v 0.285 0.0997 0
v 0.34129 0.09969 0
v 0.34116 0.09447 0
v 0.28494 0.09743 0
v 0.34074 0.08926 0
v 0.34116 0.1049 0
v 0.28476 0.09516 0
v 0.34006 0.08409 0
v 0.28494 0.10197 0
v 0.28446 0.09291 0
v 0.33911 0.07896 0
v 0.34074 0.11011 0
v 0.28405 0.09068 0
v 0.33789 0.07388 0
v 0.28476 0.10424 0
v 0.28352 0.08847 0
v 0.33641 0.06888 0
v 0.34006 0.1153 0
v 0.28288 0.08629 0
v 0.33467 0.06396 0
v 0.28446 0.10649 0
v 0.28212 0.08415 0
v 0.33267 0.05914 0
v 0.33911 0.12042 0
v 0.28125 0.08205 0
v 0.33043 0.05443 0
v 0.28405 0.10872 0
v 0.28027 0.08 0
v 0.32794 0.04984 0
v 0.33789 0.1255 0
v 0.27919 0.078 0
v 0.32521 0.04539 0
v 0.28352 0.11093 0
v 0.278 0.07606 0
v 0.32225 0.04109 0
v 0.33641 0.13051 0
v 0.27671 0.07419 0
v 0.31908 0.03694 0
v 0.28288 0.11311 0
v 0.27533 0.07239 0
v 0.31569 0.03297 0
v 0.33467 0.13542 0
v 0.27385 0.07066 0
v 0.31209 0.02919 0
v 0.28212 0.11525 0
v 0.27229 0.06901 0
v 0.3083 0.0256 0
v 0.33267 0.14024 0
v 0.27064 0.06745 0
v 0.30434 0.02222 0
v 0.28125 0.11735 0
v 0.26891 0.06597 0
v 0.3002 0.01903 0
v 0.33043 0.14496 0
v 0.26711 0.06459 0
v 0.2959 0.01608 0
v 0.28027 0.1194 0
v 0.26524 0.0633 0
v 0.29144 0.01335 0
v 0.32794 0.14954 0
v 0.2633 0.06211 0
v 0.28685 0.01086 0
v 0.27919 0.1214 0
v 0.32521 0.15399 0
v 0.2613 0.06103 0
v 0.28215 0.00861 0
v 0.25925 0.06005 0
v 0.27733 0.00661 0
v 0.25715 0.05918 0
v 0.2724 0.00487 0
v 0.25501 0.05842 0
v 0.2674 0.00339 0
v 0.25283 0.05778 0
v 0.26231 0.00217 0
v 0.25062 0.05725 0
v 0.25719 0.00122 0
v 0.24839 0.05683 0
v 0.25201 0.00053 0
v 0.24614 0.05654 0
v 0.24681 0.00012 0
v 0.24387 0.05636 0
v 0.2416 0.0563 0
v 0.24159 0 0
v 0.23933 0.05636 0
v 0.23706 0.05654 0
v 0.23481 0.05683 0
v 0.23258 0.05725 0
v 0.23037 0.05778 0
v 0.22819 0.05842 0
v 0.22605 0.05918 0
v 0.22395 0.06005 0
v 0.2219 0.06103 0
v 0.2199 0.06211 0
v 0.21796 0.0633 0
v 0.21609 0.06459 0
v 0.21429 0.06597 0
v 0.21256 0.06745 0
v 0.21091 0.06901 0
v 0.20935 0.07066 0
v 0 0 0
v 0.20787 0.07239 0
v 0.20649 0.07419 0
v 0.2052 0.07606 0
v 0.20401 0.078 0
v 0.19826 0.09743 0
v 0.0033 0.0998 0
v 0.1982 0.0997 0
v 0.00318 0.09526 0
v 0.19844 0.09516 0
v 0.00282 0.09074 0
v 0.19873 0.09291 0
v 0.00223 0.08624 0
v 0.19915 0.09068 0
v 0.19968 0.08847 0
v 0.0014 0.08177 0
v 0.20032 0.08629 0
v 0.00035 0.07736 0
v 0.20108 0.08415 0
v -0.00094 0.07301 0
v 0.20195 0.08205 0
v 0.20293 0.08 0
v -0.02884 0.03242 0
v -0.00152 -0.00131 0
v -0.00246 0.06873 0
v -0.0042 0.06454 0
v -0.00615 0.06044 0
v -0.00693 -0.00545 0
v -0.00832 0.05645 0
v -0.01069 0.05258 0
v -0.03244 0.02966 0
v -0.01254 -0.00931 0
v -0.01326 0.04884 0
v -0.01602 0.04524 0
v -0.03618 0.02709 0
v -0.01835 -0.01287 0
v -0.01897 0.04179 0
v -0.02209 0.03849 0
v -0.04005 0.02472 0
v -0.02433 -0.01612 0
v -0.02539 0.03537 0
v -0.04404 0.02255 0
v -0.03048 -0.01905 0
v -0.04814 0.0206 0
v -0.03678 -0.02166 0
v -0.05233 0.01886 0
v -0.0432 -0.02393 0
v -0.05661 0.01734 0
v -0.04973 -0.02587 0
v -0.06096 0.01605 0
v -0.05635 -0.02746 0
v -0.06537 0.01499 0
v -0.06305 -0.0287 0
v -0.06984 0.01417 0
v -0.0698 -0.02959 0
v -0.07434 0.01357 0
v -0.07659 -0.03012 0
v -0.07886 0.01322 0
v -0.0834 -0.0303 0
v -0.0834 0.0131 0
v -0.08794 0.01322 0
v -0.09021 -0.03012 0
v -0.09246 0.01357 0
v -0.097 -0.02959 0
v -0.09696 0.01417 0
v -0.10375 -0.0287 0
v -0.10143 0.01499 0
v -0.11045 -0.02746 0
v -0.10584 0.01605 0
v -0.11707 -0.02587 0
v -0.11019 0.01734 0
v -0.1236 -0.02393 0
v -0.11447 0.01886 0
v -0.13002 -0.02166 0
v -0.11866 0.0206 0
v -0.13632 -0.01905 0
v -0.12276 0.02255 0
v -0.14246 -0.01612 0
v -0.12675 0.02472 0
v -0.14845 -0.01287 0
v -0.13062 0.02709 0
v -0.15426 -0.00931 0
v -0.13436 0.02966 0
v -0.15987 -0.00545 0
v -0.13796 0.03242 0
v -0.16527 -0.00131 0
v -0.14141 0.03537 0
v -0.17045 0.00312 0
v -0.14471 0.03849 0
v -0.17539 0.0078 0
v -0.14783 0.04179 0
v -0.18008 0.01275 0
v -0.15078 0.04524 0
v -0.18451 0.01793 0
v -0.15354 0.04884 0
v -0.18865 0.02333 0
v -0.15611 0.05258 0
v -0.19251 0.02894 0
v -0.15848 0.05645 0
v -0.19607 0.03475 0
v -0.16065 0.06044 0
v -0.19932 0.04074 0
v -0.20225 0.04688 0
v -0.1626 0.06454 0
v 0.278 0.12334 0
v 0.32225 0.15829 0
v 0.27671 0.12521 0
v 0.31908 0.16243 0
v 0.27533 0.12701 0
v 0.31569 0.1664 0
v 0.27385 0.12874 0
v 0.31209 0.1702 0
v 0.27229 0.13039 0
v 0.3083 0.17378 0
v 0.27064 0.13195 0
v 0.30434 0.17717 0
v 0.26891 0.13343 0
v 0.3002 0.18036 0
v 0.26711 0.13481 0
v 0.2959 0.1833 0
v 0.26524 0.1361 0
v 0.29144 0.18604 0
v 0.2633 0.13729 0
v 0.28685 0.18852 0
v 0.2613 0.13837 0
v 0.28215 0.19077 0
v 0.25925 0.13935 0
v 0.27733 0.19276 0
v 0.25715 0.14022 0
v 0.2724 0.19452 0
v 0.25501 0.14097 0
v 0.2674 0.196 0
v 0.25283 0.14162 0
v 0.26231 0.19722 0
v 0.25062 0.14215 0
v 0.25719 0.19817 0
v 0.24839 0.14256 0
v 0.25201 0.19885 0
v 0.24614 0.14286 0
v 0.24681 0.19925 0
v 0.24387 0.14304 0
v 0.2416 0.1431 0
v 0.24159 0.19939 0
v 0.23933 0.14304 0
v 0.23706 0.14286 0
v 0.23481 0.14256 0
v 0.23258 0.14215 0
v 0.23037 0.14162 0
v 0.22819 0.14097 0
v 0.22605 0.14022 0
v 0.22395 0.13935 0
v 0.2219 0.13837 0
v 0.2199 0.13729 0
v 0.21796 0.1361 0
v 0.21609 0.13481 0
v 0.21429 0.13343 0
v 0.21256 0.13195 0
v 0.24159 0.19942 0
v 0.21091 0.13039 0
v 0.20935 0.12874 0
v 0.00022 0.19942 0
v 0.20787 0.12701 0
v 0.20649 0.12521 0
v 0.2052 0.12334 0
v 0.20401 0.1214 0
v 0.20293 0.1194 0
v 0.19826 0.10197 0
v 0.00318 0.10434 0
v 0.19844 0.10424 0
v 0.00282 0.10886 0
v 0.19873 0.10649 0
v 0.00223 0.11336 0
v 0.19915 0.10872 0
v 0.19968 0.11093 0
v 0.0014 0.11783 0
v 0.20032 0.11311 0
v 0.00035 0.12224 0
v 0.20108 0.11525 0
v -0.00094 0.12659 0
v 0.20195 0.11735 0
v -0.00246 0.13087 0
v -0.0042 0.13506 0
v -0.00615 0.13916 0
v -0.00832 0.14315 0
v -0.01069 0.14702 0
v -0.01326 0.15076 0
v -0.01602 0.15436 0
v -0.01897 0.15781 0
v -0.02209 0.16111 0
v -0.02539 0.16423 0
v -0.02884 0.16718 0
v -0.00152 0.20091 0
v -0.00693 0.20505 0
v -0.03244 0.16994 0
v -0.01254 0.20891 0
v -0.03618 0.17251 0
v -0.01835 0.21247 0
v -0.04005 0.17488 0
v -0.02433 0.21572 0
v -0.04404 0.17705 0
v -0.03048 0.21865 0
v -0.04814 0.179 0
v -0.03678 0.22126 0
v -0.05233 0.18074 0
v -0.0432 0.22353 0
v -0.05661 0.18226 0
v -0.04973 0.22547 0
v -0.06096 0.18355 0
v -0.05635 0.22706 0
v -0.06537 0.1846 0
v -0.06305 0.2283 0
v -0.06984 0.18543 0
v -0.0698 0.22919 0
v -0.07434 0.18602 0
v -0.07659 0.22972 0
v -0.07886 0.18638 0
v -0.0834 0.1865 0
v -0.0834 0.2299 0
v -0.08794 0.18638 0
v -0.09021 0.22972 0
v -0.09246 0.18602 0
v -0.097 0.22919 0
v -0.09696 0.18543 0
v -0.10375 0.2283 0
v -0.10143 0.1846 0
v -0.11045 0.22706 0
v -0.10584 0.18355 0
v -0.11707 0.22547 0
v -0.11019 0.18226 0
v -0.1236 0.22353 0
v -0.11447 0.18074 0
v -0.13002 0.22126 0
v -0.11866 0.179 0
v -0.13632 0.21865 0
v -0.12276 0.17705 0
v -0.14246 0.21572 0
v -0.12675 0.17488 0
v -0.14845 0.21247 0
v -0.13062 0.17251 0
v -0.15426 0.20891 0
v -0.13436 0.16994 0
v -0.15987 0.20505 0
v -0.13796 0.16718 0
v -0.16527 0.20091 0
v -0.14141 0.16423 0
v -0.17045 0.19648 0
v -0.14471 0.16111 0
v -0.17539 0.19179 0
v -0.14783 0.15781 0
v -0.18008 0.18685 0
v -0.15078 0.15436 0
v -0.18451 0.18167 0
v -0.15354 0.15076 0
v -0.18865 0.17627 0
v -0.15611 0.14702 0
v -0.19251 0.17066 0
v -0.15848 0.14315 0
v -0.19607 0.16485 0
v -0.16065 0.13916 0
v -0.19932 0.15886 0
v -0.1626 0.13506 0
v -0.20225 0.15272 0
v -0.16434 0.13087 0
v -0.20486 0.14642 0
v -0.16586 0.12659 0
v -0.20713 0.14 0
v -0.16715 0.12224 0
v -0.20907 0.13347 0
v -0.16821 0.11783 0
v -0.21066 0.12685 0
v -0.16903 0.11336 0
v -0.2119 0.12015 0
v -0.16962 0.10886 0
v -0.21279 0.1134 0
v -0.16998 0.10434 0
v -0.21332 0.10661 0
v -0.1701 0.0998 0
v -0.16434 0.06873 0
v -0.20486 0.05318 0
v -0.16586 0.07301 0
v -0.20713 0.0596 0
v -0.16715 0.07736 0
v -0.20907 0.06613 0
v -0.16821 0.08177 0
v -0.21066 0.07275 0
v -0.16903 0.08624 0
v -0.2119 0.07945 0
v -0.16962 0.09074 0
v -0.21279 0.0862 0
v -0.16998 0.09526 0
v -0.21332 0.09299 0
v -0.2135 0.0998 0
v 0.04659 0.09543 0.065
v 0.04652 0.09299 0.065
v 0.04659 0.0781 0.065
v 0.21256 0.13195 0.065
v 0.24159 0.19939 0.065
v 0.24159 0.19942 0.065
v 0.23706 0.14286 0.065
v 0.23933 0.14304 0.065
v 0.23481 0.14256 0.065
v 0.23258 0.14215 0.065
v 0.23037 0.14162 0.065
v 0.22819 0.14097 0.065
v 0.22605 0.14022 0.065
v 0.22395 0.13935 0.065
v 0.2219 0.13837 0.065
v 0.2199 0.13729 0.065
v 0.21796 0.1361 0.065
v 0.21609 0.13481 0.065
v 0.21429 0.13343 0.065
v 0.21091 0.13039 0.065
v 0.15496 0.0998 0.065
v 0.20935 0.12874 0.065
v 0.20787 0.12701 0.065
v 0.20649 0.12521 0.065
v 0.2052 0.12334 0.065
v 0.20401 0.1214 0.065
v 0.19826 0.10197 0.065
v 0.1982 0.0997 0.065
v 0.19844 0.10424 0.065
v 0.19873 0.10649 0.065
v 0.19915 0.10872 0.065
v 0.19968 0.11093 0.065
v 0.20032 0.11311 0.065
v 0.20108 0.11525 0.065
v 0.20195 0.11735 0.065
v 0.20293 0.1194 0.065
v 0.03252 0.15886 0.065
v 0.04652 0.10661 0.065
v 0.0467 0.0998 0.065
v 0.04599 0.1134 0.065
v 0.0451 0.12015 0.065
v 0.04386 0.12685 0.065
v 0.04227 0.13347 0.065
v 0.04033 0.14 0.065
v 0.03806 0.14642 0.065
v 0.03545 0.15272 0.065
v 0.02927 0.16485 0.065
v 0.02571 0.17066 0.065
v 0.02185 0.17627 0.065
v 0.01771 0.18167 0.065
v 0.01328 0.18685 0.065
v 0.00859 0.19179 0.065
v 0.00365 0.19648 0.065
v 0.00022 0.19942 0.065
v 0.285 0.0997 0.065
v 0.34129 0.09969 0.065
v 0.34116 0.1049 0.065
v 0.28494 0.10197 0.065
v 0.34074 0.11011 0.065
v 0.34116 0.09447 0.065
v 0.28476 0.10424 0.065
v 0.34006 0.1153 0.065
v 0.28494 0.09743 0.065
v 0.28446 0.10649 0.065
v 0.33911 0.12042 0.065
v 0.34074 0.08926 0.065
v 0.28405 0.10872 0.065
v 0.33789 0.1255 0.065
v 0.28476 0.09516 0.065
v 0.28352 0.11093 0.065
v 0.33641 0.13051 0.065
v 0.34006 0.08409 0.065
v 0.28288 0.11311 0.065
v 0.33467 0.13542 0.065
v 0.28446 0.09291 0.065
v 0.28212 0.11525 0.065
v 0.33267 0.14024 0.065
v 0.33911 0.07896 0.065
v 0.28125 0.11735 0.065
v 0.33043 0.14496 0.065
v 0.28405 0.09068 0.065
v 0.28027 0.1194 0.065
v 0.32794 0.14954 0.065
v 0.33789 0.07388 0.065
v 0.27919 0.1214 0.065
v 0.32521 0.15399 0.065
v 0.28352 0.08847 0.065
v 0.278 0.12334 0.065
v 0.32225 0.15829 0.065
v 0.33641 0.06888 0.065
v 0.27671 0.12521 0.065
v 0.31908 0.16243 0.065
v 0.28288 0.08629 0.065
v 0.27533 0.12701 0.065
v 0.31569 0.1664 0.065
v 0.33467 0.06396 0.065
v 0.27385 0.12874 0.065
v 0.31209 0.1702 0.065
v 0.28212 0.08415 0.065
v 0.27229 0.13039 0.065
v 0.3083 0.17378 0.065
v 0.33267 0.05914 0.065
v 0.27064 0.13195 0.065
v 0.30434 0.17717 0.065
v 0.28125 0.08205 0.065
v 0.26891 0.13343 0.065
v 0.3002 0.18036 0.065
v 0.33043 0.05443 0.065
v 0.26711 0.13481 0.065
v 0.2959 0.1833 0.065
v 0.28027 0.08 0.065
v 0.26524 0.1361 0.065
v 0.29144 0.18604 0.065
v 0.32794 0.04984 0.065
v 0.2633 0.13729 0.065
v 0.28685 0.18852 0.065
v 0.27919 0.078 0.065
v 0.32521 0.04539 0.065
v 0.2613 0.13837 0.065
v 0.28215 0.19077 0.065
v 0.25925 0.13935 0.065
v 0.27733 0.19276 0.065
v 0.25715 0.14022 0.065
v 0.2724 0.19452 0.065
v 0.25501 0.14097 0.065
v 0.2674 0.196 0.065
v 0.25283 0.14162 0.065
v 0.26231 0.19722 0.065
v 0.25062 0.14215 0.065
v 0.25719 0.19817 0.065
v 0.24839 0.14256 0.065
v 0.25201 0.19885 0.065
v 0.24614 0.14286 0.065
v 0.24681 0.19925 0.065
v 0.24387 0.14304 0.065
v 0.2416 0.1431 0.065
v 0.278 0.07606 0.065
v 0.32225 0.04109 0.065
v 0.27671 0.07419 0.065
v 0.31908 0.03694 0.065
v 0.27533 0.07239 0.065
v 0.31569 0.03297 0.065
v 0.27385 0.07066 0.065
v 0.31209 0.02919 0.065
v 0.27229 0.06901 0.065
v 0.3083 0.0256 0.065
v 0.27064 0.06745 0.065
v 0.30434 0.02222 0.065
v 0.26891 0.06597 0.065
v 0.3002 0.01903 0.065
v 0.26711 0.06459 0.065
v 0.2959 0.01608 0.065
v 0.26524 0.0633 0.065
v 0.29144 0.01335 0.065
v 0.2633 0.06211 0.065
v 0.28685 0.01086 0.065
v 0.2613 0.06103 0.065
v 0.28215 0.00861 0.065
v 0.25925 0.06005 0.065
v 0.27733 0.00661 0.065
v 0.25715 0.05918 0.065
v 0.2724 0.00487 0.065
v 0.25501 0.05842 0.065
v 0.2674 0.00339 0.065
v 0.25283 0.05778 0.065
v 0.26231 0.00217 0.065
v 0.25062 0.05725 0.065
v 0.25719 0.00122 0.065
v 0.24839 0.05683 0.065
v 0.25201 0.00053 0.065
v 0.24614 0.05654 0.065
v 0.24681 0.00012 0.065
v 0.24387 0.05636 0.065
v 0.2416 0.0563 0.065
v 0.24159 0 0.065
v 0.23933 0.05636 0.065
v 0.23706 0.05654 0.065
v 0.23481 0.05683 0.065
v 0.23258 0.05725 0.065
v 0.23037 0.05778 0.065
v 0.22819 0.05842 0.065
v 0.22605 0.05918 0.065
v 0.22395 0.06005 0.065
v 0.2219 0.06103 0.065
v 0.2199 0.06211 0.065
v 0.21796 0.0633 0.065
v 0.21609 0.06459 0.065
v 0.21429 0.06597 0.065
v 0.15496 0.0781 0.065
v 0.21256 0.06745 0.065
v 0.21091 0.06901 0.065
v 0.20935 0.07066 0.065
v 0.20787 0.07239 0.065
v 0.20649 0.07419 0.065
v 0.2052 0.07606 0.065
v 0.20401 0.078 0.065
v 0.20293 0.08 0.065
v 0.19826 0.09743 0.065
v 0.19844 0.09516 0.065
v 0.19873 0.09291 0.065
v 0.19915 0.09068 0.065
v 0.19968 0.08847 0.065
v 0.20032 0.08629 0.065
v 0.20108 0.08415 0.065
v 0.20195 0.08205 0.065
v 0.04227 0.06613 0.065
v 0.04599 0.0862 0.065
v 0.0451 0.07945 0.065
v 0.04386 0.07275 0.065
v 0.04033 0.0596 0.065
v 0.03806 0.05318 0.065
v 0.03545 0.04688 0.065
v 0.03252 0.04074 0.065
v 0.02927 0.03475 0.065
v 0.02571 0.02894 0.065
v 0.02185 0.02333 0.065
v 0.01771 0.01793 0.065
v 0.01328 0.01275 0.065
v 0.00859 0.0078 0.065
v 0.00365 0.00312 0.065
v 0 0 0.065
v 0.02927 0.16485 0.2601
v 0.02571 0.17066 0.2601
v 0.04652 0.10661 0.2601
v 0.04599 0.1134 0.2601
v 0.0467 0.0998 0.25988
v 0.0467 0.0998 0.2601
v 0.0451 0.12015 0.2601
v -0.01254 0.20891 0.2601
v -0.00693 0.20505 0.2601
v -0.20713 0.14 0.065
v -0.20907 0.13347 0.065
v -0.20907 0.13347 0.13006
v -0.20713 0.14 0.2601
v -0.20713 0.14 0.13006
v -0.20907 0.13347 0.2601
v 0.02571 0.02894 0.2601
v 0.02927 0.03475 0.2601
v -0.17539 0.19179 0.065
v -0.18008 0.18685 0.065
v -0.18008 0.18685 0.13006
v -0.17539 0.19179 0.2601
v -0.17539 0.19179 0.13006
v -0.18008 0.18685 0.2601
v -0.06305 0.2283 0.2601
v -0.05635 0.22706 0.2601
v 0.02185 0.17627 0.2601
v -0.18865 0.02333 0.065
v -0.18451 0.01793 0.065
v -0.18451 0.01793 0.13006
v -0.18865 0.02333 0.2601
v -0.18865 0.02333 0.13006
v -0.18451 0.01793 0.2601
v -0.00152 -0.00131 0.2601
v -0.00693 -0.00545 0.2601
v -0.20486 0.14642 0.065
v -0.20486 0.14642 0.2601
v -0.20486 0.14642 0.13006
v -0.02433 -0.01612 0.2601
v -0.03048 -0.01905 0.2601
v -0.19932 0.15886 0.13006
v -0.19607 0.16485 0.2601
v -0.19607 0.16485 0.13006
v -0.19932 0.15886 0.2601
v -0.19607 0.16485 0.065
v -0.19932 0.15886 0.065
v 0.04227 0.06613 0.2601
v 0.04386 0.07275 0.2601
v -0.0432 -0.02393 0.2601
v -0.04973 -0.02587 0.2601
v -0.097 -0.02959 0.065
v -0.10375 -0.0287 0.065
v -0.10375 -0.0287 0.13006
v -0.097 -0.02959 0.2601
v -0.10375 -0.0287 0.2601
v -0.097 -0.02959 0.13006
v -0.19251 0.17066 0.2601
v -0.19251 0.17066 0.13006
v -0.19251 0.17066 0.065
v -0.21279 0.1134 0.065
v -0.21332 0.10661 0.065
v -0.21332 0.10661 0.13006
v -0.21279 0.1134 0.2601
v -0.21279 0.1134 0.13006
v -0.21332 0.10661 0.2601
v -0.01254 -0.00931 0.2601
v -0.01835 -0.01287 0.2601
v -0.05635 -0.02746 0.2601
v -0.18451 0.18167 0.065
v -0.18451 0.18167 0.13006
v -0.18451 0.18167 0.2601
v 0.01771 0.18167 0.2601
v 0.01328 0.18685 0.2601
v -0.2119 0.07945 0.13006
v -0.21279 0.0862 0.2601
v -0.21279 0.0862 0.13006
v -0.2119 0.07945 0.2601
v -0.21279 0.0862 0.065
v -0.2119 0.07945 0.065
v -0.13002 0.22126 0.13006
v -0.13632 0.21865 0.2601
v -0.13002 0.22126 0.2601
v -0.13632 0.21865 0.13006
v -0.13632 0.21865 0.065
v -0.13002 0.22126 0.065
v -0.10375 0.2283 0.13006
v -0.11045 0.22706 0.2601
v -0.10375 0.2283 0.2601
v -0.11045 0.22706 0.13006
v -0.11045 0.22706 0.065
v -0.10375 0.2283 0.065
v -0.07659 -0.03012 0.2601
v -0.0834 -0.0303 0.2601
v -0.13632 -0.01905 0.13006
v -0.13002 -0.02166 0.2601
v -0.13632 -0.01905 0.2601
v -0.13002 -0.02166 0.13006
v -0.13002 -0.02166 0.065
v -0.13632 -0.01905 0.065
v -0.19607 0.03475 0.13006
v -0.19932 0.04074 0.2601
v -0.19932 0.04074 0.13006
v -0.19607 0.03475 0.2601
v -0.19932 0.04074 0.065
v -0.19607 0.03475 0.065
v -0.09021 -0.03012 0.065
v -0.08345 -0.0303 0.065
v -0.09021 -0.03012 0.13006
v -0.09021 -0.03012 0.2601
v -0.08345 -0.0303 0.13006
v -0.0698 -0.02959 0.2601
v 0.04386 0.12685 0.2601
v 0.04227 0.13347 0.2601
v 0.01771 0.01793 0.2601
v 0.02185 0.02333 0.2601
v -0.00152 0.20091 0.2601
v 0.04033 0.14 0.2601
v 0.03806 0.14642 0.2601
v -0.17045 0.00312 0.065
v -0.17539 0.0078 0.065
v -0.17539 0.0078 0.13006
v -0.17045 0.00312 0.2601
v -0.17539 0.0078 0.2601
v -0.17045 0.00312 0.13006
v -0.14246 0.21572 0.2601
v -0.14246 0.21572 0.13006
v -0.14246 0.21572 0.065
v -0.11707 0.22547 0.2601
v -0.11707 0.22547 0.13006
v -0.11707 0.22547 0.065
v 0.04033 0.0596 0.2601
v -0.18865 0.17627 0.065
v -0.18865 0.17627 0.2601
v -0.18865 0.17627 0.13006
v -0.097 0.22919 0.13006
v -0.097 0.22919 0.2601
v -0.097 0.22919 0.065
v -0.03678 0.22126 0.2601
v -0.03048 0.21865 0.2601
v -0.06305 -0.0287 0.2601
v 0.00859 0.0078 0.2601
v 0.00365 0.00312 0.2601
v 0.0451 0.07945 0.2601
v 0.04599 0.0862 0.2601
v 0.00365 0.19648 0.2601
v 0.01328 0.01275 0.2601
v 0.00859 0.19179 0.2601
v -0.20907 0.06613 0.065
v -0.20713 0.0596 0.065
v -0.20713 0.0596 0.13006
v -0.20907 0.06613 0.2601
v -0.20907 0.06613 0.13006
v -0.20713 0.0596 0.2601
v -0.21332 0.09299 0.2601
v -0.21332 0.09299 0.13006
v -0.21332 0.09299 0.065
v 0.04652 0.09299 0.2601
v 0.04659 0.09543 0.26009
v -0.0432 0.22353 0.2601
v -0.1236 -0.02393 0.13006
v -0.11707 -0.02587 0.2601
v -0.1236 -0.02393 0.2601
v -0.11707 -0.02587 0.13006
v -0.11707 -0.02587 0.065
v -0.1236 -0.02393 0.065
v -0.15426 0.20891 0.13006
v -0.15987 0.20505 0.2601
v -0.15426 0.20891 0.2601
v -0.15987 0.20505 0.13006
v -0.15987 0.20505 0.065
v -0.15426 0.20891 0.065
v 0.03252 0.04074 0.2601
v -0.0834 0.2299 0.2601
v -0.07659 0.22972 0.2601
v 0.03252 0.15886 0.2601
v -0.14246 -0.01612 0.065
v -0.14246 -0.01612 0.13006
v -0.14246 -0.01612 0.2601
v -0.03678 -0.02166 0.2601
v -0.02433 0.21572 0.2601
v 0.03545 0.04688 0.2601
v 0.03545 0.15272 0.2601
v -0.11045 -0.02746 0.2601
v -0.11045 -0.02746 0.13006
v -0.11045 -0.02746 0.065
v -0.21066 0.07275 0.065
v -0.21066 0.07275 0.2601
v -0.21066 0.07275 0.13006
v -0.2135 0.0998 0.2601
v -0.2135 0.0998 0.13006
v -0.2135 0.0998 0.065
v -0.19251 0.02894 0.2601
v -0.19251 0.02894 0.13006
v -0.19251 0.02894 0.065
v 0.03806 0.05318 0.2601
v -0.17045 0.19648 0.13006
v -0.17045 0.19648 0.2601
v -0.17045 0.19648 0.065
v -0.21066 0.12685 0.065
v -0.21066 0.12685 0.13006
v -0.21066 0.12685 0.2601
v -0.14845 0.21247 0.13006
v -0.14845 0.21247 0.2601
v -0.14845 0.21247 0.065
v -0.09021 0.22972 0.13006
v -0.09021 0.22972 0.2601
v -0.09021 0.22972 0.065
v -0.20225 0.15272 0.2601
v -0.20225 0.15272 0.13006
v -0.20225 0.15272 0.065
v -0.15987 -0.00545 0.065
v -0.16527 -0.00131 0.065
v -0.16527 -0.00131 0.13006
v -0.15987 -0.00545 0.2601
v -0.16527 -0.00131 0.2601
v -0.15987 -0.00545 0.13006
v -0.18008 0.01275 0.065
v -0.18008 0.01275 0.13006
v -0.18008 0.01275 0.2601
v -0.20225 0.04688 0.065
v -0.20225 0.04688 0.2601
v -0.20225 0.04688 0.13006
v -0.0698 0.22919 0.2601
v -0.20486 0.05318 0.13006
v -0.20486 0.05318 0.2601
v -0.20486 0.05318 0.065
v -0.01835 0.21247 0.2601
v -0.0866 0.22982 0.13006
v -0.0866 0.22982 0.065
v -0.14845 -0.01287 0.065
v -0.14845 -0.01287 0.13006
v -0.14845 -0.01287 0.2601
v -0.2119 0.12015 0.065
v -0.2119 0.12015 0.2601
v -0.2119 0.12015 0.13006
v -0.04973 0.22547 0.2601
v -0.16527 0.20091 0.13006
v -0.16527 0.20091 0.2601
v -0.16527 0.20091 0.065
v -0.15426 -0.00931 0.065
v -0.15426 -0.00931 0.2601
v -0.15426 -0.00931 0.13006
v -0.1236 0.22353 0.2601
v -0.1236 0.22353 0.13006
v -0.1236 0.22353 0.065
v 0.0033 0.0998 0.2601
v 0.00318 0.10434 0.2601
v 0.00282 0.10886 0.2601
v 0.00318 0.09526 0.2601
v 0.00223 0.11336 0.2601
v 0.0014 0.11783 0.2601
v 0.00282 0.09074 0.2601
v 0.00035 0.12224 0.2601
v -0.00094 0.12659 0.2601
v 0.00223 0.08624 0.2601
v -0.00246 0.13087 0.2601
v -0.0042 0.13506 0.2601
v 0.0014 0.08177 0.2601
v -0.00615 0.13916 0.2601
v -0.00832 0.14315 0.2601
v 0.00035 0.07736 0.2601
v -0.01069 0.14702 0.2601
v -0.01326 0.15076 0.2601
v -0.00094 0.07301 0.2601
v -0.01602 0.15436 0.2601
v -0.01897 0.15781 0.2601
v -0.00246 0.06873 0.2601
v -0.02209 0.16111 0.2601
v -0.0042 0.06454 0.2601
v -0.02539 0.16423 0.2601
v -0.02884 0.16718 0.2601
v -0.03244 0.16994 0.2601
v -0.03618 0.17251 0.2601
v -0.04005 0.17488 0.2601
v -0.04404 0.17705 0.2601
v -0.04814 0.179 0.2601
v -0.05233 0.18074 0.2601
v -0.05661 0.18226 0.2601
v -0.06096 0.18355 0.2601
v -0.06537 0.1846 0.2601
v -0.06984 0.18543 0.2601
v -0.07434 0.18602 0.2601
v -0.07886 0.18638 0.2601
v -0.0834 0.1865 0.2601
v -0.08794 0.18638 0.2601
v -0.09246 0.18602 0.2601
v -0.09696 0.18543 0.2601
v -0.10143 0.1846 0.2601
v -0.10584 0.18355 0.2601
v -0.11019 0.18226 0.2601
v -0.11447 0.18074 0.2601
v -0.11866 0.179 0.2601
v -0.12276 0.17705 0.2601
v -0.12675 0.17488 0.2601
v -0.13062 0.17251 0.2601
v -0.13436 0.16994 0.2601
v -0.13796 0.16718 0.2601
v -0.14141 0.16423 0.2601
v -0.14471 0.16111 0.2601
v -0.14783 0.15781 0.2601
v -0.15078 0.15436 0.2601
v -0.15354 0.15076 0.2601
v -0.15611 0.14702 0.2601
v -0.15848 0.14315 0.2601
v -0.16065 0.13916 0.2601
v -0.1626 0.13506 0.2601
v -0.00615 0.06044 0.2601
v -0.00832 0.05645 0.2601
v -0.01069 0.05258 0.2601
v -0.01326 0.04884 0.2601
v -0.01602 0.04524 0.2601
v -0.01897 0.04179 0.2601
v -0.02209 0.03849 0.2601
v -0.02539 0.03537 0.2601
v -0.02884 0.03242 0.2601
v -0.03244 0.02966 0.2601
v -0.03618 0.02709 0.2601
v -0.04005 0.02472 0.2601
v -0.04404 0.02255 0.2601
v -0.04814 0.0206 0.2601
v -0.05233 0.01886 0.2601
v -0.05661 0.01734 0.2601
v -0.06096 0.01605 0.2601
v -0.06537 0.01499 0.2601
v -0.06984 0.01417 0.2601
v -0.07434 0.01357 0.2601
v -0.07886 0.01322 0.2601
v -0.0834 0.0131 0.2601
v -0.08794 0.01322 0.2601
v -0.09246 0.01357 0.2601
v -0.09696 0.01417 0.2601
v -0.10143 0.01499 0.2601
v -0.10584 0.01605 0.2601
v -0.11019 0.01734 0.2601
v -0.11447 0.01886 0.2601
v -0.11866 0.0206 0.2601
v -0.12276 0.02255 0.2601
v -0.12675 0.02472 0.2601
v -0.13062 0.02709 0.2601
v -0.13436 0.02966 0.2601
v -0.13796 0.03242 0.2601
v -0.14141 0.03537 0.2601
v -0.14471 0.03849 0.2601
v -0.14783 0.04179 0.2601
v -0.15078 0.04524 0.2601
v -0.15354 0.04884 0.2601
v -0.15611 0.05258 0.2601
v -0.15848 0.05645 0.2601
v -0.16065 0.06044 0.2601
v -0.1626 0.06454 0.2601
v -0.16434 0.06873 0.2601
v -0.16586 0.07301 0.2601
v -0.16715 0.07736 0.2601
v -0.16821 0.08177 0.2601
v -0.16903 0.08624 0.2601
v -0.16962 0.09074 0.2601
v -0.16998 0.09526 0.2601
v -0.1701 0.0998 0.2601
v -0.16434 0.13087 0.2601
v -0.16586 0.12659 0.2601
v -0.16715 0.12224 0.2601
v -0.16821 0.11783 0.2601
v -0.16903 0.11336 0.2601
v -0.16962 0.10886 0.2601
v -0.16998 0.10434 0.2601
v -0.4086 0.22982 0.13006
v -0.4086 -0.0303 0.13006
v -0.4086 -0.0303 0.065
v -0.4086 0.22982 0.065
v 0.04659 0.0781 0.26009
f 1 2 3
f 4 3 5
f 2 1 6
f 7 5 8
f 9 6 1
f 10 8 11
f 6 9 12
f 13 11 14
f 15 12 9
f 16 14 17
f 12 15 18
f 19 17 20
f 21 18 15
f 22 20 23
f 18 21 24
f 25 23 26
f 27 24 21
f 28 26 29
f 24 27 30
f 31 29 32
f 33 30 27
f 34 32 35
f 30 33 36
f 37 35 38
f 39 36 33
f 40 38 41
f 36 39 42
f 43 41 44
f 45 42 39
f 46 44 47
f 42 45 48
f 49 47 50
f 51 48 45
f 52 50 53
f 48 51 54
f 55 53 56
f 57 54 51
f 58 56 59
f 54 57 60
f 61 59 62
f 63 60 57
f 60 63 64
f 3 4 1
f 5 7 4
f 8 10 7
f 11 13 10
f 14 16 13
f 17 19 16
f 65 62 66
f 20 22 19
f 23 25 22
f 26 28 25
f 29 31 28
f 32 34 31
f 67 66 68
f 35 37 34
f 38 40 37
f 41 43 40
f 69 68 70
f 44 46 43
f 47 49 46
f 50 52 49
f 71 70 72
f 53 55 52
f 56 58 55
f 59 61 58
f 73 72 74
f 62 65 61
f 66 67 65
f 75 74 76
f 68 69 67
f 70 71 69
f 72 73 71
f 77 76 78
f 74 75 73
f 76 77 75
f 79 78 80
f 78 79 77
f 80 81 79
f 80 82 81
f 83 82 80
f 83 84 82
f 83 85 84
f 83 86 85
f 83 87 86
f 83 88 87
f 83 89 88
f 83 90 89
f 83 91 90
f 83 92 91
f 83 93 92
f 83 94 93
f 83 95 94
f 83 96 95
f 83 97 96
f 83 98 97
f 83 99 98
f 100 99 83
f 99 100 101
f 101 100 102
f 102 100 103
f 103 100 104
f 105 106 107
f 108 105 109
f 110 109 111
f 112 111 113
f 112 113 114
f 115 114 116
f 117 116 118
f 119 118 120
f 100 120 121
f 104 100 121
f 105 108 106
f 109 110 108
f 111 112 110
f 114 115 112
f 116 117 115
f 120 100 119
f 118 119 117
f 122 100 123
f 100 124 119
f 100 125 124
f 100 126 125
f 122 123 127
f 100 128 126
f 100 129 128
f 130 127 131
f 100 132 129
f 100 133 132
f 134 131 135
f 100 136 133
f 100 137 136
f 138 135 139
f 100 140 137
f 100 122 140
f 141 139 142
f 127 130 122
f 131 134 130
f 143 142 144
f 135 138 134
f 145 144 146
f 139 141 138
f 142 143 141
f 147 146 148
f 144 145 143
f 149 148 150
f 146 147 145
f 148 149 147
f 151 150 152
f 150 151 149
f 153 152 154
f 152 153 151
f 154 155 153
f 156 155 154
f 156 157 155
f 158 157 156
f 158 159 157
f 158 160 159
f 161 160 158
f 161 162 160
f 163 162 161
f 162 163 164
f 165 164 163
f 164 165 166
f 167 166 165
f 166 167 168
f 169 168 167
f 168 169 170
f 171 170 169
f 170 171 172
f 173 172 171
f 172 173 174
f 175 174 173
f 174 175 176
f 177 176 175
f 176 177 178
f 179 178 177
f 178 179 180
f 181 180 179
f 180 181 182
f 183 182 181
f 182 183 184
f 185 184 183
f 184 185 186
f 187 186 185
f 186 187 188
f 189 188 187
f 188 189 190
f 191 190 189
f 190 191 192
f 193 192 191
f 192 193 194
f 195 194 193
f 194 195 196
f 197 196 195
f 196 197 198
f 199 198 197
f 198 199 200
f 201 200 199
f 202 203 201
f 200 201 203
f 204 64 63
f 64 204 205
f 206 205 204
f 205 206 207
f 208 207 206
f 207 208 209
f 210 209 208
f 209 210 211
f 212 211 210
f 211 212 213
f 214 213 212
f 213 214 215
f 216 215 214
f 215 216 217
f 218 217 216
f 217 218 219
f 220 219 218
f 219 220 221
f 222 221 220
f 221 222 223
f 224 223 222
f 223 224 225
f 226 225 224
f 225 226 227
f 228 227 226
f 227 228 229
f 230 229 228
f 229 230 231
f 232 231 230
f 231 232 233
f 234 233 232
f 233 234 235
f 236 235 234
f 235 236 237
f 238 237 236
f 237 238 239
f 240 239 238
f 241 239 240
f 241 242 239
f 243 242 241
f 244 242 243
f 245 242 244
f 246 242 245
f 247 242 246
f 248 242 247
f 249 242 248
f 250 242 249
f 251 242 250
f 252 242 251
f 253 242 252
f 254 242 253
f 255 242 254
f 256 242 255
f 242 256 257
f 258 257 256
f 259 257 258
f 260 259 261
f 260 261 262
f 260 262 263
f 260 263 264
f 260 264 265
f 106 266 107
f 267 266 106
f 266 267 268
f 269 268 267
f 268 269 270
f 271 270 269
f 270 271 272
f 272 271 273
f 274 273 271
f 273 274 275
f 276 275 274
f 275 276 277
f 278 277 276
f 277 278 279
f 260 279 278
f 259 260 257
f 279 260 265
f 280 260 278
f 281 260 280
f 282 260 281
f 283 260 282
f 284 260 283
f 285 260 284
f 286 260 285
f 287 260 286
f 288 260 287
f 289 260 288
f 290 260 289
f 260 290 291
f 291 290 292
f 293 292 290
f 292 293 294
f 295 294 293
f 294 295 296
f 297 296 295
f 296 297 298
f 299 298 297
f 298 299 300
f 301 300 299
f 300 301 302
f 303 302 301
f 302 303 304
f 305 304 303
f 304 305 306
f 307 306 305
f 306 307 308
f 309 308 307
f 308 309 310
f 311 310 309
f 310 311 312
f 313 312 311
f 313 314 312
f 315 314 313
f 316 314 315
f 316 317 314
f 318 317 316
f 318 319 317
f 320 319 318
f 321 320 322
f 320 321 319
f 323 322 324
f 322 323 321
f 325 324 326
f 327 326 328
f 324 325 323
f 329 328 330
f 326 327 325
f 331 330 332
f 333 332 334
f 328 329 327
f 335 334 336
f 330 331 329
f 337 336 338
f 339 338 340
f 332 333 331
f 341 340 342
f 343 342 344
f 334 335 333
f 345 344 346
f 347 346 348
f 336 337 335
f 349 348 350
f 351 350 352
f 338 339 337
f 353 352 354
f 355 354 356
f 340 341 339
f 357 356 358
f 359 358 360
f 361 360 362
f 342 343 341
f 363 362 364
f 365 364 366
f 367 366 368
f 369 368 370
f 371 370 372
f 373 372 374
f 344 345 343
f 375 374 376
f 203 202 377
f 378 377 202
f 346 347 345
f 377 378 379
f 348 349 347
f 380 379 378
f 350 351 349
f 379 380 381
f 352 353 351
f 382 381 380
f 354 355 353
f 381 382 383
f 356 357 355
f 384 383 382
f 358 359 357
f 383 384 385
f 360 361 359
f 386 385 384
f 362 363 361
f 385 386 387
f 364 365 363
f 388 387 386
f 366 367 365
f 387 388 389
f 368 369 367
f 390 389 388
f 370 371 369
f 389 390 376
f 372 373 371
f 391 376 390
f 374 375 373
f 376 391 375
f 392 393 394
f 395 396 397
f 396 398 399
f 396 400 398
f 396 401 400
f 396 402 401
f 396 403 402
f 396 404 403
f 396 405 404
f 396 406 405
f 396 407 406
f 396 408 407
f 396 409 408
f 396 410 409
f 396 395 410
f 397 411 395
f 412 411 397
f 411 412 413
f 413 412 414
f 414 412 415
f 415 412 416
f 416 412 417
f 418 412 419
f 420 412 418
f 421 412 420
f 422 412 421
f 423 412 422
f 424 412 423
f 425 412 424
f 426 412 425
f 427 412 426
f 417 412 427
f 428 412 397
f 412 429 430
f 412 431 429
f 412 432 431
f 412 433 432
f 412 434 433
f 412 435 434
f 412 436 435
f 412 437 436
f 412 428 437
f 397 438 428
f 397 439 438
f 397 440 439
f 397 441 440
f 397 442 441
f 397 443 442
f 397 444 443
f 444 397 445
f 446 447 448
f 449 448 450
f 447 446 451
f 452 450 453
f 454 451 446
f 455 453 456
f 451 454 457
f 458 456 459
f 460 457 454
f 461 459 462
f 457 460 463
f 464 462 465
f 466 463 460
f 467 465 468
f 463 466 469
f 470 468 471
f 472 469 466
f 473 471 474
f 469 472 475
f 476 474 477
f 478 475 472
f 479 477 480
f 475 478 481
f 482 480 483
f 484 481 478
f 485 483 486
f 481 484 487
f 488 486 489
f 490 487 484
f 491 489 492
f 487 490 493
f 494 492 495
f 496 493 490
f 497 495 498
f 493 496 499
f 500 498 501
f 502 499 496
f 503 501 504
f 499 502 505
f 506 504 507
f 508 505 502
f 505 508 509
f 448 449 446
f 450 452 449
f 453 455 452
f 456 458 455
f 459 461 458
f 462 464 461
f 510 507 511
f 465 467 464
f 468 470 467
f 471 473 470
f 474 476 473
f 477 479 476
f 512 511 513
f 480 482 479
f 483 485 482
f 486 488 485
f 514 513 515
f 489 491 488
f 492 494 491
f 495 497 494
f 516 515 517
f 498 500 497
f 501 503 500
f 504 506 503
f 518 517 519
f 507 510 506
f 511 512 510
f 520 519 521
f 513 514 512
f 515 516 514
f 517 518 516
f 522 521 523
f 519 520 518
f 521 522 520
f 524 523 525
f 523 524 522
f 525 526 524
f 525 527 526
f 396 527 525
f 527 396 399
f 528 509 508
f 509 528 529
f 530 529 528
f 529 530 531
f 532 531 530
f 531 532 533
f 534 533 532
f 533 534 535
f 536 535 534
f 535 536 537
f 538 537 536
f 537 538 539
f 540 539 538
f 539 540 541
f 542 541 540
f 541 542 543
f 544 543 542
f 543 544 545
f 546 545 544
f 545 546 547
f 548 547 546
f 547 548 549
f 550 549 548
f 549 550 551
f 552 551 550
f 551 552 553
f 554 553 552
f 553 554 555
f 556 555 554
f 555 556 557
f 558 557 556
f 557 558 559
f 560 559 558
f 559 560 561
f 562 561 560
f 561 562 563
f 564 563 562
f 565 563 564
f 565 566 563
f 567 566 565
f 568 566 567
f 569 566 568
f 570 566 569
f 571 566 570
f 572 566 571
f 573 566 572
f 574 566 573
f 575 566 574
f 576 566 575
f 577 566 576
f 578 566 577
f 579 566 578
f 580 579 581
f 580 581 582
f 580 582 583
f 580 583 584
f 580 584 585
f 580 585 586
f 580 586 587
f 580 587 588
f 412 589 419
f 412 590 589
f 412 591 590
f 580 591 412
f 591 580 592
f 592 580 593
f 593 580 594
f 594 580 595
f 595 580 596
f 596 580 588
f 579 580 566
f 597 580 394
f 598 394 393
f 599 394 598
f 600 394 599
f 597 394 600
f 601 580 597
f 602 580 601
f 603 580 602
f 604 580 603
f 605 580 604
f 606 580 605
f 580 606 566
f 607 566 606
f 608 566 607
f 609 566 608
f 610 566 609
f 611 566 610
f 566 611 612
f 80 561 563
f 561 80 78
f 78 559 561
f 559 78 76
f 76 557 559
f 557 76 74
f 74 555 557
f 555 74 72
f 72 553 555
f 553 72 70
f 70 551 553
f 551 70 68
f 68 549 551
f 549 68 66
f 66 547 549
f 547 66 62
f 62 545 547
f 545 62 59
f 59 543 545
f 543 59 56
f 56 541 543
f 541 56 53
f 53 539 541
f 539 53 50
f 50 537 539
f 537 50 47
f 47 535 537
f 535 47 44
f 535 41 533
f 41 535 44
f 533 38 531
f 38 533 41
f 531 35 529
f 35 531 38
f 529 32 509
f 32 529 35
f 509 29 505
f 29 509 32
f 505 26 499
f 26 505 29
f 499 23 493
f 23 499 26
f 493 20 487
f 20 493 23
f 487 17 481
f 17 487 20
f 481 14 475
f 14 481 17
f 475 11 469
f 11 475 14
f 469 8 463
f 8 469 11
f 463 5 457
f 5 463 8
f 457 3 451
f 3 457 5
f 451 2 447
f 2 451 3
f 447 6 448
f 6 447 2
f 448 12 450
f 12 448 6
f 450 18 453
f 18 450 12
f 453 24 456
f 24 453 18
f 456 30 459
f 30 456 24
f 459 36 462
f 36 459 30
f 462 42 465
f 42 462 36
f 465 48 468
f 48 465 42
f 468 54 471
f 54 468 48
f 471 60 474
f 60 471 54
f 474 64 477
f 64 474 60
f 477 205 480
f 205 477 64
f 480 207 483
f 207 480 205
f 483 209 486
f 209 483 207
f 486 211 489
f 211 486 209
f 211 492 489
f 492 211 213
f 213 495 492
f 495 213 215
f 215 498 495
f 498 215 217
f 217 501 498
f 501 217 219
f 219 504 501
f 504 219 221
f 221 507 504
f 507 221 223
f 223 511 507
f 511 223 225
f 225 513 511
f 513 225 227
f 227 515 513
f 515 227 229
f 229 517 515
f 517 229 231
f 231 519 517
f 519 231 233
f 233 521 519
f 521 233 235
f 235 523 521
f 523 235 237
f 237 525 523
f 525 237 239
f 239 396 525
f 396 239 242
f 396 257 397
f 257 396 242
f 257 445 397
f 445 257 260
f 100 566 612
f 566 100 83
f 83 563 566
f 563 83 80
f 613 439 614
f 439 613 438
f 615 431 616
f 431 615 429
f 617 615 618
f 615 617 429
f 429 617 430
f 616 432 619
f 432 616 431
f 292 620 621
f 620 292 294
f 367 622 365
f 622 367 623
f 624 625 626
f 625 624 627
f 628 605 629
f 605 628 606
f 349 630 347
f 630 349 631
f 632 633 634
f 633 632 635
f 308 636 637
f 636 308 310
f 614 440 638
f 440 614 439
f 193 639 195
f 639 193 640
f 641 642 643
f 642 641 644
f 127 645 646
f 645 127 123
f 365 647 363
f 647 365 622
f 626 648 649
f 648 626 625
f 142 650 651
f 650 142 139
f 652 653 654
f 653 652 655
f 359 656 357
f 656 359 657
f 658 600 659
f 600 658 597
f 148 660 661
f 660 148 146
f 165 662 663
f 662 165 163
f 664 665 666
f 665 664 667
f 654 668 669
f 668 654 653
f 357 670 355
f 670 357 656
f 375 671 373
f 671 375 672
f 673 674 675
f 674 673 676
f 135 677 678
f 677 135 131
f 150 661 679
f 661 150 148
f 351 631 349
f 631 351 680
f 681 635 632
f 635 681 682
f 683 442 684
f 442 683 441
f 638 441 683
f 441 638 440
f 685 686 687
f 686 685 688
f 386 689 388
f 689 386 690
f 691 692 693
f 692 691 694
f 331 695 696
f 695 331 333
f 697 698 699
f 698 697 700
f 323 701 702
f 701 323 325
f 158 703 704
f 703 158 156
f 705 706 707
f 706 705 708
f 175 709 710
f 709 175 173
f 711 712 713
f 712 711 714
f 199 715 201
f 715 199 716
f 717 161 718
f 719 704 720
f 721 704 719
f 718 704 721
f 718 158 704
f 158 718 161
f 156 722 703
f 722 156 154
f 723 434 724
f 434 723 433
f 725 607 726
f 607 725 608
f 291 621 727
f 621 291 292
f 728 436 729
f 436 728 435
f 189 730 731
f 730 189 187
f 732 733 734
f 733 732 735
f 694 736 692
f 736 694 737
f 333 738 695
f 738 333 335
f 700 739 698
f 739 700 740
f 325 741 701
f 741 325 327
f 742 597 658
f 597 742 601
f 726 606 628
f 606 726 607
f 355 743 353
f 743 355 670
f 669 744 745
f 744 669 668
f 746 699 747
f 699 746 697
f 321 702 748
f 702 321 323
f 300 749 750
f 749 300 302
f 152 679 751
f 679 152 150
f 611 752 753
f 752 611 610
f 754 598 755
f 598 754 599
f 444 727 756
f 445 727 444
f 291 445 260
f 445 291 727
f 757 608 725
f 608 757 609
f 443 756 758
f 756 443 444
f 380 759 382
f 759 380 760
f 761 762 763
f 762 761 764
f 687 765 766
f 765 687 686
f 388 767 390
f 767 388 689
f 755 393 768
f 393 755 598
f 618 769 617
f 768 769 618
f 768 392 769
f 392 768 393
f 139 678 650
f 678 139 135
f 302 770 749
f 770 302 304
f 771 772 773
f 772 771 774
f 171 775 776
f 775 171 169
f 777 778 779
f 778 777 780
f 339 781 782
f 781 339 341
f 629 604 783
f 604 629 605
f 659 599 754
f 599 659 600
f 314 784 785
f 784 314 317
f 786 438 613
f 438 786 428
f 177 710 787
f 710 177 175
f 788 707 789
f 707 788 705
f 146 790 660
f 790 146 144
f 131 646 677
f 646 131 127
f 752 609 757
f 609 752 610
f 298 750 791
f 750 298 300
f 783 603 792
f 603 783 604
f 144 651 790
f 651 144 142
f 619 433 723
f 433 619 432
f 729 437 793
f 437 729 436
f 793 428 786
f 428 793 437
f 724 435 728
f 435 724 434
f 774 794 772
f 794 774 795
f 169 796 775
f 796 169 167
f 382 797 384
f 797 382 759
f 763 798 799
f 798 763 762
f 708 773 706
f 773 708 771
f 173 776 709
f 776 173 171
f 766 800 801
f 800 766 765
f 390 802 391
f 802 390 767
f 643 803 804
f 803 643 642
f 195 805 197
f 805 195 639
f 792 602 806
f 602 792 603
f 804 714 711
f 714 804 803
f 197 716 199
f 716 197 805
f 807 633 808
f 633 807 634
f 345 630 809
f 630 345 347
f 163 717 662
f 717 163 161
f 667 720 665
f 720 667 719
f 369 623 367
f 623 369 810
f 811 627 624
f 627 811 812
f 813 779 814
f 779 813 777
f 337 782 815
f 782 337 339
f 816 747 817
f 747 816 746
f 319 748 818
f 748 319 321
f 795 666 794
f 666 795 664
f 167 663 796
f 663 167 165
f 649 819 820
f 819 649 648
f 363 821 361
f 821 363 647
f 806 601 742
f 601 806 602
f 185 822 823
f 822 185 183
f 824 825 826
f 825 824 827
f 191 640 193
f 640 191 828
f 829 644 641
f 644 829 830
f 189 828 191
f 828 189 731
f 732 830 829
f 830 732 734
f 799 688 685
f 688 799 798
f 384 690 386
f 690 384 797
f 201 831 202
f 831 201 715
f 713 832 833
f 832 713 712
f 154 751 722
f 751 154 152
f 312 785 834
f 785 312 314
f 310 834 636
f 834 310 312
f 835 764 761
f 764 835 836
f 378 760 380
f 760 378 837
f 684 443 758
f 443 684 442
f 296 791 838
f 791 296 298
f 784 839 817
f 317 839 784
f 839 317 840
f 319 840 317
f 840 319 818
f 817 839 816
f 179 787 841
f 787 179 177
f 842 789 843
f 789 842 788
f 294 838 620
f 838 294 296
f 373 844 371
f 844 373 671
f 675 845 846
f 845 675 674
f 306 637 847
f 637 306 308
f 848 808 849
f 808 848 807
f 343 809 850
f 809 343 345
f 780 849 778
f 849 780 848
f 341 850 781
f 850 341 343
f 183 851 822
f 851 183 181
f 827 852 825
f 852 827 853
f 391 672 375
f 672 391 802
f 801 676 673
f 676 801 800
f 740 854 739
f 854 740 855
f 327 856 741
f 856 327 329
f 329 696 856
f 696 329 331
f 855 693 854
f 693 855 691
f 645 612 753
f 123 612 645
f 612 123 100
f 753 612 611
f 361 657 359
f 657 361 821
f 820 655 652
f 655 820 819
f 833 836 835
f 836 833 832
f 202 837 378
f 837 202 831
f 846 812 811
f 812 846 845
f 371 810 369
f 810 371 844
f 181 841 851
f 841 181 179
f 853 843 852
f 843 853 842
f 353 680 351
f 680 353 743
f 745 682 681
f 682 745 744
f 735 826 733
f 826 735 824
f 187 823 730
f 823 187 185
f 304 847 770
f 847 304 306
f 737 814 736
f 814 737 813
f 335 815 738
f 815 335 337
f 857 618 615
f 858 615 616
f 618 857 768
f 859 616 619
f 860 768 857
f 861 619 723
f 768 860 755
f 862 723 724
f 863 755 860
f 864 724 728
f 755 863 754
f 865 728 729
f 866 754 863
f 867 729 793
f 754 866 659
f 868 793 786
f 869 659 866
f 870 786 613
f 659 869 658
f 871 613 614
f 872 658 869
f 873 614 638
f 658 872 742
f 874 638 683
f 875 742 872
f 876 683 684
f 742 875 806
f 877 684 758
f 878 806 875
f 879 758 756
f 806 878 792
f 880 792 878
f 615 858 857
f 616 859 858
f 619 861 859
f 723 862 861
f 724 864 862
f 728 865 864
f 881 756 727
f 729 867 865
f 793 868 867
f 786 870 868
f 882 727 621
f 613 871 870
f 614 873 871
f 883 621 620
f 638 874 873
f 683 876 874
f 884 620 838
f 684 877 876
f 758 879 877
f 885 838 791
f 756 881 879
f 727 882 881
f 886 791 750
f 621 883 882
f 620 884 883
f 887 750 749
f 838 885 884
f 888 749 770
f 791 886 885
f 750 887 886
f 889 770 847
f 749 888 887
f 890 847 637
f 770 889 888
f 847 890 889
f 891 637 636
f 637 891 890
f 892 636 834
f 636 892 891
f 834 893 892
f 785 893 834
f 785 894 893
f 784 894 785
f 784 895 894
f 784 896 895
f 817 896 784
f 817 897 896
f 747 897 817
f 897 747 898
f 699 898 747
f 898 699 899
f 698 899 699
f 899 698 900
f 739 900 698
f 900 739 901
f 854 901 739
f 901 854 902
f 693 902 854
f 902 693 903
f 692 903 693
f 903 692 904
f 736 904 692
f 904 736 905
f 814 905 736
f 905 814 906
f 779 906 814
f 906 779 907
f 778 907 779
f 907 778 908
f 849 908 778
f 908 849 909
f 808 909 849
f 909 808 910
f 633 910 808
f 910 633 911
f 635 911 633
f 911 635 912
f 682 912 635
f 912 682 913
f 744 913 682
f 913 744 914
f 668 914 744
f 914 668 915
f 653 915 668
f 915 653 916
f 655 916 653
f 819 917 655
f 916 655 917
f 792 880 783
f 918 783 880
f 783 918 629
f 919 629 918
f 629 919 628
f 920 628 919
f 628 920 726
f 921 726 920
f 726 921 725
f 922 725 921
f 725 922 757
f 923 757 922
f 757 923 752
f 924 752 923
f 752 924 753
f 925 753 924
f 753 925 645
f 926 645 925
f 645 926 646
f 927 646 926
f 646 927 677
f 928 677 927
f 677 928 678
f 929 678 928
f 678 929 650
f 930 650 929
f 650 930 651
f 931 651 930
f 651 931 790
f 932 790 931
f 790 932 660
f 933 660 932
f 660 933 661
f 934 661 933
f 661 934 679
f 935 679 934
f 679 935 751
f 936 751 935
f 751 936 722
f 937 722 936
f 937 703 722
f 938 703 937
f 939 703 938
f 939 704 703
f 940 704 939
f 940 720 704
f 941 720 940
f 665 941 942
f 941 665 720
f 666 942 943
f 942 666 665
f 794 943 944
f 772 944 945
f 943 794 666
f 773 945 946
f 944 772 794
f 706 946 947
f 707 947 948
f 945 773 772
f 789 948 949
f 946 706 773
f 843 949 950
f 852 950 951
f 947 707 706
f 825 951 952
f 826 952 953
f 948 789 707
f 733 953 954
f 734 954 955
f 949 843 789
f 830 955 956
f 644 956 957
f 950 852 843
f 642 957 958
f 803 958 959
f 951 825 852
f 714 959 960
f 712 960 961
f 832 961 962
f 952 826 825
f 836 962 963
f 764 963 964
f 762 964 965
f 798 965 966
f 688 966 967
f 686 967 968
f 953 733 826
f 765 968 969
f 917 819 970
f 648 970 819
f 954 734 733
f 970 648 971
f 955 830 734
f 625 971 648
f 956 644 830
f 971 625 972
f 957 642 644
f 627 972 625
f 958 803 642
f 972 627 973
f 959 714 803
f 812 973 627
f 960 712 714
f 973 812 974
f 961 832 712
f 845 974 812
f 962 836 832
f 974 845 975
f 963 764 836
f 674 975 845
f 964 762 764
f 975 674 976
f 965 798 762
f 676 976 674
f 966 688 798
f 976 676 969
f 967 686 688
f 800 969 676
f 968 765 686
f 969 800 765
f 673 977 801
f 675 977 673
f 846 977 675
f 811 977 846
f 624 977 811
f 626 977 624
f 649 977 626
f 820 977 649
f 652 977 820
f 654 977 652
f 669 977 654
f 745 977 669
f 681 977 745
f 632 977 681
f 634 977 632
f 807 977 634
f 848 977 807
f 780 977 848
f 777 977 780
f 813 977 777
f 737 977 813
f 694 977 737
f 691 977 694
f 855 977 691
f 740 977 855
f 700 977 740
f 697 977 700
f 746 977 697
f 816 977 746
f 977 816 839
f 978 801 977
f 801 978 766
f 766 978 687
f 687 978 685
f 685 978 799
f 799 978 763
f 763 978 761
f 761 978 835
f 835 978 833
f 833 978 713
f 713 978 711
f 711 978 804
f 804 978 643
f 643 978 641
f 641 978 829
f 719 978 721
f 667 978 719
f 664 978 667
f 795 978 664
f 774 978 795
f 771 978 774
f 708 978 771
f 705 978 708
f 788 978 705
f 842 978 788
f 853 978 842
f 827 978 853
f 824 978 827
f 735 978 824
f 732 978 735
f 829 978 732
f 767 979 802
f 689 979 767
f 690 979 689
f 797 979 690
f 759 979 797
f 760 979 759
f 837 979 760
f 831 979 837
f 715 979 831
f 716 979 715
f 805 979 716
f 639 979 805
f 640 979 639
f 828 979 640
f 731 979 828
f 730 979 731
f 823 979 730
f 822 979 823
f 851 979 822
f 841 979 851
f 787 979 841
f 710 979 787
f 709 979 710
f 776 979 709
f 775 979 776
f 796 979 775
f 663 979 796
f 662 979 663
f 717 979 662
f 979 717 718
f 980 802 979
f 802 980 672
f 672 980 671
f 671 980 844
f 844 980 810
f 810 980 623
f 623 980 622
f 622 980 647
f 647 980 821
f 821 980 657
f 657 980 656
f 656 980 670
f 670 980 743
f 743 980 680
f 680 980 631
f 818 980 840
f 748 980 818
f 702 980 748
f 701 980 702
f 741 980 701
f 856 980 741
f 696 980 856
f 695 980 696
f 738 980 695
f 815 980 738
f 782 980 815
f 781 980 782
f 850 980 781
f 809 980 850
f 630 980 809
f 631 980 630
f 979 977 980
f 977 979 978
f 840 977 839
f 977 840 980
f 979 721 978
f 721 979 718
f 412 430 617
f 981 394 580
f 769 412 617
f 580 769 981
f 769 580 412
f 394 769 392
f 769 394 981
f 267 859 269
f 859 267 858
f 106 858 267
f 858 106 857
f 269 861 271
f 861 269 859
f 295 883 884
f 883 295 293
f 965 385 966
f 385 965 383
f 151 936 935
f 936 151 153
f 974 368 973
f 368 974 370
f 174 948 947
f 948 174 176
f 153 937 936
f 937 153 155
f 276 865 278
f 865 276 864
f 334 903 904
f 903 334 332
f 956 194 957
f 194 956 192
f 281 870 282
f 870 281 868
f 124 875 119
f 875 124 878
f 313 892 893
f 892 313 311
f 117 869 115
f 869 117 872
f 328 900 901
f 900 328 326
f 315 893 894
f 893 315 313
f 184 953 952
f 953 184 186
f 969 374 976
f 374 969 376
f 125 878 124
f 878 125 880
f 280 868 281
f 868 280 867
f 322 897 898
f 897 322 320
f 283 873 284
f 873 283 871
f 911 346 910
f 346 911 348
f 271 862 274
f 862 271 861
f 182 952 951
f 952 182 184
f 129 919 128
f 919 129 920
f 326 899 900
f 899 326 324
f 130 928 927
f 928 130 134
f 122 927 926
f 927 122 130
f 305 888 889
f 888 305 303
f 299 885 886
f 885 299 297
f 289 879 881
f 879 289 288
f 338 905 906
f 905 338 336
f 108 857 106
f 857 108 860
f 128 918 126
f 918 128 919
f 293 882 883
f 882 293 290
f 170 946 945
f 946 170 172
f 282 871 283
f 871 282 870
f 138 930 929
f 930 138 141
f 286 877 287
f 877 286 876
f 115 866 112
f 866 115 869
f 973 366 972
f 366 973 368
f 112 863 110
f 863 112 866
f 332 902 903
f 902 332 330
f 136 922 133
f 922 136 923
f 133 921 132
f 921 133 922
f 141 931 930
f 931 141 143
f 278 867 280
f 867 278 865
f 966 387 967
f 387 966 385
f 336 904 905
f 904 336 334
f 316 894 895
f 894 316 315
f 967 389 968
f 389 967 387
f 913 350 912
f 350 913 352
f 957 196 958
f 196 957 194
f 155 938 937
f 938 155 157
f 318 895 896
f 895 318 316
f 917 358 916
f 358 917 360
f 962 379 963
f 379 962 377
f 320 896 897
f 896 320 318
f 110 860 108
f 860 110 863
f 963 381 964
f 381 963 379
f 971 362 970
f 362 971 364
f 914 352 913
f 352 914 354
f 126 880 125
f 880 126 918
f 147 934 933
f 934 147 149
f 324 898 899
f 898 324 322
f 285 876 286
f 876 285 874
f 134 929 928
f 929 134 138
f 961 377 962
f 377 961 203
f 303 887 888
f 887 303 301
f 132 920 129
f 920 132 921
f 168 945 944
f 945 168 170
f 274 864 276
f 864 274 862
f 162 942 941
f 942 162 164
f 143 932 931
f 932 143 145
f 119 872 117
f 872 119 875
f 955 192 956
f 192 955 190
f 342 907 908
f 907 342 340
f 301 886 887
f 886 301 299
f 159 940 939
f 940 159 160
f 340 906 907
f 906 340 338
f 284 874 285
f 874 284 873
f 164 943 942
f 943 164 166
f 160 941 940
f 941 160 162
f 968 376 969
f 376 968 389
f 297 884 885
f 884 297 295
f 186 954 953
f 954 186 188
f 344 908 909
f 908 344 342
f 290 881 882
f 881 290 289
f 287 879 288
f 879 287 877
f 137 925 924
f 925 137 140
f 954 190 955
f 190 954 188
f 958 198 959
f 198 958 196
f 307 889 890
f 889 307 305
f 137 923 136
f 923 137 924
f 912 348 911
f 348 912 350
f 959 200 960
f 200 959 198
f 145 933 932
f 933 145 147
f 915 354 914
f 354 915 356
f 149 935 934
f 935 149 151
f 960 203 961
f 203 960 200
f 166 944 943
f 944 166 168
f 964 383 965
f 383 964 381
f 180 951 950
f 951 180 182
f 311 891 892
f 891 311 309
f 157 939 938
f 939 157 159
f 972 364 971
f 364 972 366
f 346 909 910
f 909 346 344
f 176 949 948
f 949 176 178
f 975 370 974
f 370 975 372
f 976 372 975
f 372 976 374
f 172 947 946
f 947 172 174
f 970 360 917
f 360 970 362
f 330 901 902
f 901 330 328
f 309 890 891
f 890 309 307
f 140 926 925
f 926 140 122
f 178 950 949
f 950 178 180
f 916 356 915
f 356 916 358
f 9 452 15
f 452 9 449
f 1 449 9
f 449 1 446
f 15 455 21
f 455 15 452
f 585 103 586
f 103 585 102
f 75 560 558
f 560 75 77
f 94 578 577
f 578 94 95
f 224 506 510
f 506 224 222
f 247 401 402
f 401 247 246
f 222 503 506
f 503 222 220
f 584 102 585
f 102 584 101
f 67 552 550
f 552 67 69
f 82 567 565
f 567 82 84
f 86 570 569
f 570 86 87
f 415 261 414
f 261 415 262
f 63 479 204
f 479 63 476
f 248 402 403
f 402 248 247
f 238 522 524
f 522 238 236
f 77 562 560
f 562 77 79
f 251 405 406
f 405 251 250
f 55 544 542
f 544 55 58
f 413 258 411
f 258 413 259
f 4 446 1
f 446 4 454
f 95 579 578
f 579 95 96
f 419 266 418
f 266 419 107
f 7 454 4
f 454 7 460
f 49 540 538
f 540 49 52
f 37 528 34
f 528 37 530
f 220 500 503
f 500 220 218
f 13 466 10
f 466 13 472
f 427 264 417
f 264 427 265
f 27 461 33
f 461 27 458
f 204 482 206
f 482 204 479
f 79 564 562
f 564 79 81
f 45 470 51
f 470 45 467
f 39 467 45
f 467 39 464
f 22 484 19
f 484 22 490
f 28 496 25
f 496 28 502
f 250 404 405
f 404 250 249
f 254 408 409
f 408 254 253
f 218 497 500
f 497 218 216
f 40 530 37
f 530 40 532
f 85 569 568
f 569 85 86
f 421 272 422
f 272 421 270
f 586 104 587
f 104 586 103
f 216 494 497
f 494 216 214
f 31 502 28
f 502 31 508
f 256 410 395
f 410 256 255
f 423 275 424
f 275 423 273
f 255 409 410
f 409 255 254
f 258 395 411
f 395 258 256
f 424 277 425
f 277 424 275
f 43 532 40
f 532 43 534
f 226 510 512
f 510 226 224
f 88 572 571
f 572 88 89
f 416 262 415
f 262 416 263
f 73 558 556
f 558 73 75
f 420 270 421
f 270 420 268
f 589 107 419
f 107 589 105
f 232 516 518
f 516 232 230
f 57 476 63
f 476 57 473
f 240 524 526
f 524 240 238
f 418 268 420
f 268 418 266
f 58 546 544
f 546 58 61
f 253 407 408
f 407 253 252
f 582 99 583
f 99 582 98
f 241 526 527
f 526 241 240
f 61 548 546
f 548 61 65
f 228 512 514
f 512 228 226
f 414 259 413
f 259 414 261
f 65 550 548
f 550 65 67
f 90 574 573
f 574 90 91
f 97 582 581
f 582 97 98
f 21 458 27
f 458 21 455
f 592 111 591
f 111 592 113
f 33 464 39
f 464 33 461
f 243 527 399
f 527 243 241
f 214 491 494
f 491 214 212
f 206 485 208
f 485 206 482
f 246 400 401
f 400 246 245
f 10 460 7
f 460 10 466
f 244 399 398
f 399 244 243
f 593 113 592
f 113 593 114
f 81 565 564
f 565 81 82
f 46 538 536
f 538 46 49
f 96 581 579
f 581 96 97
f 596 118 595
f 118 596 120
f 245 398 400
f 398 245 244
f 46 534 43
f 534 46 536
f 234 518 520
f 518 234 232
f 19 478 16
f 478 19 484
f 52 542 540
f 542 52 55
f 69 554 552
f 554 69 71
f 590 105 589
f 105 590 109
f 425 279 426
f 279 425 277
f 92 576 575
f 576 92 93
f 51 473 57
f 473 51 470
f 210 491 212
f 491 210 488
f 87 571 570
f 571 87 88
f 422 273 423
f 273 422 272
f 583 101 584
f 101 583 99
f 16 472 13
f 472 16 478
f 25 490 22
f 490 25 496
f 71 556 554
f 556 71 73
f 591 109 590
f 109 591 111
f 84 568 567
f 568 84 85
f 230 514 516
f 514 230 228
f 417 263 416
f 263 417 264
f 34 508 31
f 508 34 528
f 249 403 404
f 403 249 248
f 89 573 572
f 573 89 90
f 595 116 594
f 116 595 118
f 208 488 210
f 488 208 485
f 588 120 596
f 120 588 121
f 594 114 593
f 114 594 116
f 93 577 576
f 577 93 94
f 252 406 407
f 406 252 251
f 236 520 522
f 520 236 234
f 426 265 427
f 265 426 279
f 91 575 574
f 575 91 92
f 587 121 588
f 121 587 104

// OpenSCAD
// ============================================================
//  Bracket : rounded base plate + hollow sleeve + stepped arm
//            + triangular stiffening rib
//  All dimensions in millimetres
// ============================================================

$fn  = 120;
eps  = 0.001;                 // overlap / clean-cut allowance

// ---------------- Main base (first reference body) ----------
base_len   = 0.341352;        // overall length  (X)
base_w     = 0.199422;        // overall width   (Y)
base_h     = 0.065;           // extrusion depth (Z)
base_cx    = 0.2416;          // circle centre from left edge
base_cy    = 0.0997;          // circle centre from front edge
base_ro    = 0.0997;          // outer radius of rounded end
base_ri    = 0.0434;          // inner (through) radius

// ---------------- Tall hollow sleeve ------------------------
sleeve_cx  = -0.0834;         // centre offset from left reference
sleeve_cy  =  0.0998;         // centre offset from front reference
sleeve_ro  =  0.1301;         // outer radius (span 0.2602)
sleeve_ri  =  0.0867;         // inner radius (through bore)
sleeve_h   =  0.2601;         // upward reach from base datum

// ---------------- Projecting arm (stepped tier) -------------
arm_x0     = -0.4086;         // left edge offset
arm_len    =  0.325145;       // length  (X)
arm_y0     = -0.0303;         // front edge offset
arm_w      =  0.260116;       // width   (Y)
arm_z0     =  0.065;          // lower band removed up to here
arm_z1     =  0.130058;       // top of arm from base datum

// ---------------- Triangular web / rib ----------------------
rib_x0     = 0.0466;          // rib start (sleeve outer face)
rib_run    = 0.108382;        // plan run toward the base
rib_t      = 0.0217;          // material thickness (Y)
rib_y_back = 0.0998;          // back face of the rib
rib_z0     = 0.065;           // sits on the base top face
rib_rise   = 0.195087;        // vertical rise (to sleeve top 0.2601)

// ============================================================
//  MODULES
// ============================================================

// Rounded "D" shaped base plate with the annular boss profile
module base_plate() {
    linear_extrude(height = base_h)
        union() {
            // straight portion of the plate
            square([base_cx, base_w]);
            // rounded (annular) end
            translate([base_cx, base_cy]) circle(r = base_ro);
        }
}

// Tall hollow sleeve (annular cylinder, concentric bore)
module sleeve() {
    translate([sleeve_cx, sleeve_cy, 0])
        cylinder(h = sleeve_h, r = sleeve_ro);
}

// Projecting straight-sided arm, already trimmed to the
// raised stepped tier (lower band 0 .. arm_z0 removed)
module arm() {
    translate([arm_x0, arm_y0, arm_z0])
        cube([arm_len, arm_w, arm_z1 - arm_z0]);
}

// Narrow triangular web between sleeve wall and base top face
module rib() {
    translate([0, rib_y_back, 0])
        rotate([90, 0, 0])
            linear_extrude(height = rib_t)
                polygon(points = [
                    [rib_x0,           rib_z0],
                    [rib_x0 + rib_run, rib_z0],
                    [rib_x0,           rib_z0 + rib_rise]
                ]);
}

// ============================================================
//  ASSEMBLY : solids united, then bores cut through
// ============================================================
module bracket() {
    difference() {
        union() {
            base_plate();     // step 1 : base slab
            sleeve();         // step 2 : tall hollow sleeve
            arm();            // step 3 : stepped arm tier
            rib();            // step 4 : triangular web
        }

        // step 5 : sleeve through bore
        translate([sleeve_cx, sleeve_cy, -eps])
            cylinder(h = sleeve_h + 2*eps, r = sleeve_ri);

        // step 6 : small through hole in the base annulus
        translate([base_cx, base_cy, -eps])
            cylinder(h = base_h + 2*eps, r = base_ri);
    }
}

bracket();
